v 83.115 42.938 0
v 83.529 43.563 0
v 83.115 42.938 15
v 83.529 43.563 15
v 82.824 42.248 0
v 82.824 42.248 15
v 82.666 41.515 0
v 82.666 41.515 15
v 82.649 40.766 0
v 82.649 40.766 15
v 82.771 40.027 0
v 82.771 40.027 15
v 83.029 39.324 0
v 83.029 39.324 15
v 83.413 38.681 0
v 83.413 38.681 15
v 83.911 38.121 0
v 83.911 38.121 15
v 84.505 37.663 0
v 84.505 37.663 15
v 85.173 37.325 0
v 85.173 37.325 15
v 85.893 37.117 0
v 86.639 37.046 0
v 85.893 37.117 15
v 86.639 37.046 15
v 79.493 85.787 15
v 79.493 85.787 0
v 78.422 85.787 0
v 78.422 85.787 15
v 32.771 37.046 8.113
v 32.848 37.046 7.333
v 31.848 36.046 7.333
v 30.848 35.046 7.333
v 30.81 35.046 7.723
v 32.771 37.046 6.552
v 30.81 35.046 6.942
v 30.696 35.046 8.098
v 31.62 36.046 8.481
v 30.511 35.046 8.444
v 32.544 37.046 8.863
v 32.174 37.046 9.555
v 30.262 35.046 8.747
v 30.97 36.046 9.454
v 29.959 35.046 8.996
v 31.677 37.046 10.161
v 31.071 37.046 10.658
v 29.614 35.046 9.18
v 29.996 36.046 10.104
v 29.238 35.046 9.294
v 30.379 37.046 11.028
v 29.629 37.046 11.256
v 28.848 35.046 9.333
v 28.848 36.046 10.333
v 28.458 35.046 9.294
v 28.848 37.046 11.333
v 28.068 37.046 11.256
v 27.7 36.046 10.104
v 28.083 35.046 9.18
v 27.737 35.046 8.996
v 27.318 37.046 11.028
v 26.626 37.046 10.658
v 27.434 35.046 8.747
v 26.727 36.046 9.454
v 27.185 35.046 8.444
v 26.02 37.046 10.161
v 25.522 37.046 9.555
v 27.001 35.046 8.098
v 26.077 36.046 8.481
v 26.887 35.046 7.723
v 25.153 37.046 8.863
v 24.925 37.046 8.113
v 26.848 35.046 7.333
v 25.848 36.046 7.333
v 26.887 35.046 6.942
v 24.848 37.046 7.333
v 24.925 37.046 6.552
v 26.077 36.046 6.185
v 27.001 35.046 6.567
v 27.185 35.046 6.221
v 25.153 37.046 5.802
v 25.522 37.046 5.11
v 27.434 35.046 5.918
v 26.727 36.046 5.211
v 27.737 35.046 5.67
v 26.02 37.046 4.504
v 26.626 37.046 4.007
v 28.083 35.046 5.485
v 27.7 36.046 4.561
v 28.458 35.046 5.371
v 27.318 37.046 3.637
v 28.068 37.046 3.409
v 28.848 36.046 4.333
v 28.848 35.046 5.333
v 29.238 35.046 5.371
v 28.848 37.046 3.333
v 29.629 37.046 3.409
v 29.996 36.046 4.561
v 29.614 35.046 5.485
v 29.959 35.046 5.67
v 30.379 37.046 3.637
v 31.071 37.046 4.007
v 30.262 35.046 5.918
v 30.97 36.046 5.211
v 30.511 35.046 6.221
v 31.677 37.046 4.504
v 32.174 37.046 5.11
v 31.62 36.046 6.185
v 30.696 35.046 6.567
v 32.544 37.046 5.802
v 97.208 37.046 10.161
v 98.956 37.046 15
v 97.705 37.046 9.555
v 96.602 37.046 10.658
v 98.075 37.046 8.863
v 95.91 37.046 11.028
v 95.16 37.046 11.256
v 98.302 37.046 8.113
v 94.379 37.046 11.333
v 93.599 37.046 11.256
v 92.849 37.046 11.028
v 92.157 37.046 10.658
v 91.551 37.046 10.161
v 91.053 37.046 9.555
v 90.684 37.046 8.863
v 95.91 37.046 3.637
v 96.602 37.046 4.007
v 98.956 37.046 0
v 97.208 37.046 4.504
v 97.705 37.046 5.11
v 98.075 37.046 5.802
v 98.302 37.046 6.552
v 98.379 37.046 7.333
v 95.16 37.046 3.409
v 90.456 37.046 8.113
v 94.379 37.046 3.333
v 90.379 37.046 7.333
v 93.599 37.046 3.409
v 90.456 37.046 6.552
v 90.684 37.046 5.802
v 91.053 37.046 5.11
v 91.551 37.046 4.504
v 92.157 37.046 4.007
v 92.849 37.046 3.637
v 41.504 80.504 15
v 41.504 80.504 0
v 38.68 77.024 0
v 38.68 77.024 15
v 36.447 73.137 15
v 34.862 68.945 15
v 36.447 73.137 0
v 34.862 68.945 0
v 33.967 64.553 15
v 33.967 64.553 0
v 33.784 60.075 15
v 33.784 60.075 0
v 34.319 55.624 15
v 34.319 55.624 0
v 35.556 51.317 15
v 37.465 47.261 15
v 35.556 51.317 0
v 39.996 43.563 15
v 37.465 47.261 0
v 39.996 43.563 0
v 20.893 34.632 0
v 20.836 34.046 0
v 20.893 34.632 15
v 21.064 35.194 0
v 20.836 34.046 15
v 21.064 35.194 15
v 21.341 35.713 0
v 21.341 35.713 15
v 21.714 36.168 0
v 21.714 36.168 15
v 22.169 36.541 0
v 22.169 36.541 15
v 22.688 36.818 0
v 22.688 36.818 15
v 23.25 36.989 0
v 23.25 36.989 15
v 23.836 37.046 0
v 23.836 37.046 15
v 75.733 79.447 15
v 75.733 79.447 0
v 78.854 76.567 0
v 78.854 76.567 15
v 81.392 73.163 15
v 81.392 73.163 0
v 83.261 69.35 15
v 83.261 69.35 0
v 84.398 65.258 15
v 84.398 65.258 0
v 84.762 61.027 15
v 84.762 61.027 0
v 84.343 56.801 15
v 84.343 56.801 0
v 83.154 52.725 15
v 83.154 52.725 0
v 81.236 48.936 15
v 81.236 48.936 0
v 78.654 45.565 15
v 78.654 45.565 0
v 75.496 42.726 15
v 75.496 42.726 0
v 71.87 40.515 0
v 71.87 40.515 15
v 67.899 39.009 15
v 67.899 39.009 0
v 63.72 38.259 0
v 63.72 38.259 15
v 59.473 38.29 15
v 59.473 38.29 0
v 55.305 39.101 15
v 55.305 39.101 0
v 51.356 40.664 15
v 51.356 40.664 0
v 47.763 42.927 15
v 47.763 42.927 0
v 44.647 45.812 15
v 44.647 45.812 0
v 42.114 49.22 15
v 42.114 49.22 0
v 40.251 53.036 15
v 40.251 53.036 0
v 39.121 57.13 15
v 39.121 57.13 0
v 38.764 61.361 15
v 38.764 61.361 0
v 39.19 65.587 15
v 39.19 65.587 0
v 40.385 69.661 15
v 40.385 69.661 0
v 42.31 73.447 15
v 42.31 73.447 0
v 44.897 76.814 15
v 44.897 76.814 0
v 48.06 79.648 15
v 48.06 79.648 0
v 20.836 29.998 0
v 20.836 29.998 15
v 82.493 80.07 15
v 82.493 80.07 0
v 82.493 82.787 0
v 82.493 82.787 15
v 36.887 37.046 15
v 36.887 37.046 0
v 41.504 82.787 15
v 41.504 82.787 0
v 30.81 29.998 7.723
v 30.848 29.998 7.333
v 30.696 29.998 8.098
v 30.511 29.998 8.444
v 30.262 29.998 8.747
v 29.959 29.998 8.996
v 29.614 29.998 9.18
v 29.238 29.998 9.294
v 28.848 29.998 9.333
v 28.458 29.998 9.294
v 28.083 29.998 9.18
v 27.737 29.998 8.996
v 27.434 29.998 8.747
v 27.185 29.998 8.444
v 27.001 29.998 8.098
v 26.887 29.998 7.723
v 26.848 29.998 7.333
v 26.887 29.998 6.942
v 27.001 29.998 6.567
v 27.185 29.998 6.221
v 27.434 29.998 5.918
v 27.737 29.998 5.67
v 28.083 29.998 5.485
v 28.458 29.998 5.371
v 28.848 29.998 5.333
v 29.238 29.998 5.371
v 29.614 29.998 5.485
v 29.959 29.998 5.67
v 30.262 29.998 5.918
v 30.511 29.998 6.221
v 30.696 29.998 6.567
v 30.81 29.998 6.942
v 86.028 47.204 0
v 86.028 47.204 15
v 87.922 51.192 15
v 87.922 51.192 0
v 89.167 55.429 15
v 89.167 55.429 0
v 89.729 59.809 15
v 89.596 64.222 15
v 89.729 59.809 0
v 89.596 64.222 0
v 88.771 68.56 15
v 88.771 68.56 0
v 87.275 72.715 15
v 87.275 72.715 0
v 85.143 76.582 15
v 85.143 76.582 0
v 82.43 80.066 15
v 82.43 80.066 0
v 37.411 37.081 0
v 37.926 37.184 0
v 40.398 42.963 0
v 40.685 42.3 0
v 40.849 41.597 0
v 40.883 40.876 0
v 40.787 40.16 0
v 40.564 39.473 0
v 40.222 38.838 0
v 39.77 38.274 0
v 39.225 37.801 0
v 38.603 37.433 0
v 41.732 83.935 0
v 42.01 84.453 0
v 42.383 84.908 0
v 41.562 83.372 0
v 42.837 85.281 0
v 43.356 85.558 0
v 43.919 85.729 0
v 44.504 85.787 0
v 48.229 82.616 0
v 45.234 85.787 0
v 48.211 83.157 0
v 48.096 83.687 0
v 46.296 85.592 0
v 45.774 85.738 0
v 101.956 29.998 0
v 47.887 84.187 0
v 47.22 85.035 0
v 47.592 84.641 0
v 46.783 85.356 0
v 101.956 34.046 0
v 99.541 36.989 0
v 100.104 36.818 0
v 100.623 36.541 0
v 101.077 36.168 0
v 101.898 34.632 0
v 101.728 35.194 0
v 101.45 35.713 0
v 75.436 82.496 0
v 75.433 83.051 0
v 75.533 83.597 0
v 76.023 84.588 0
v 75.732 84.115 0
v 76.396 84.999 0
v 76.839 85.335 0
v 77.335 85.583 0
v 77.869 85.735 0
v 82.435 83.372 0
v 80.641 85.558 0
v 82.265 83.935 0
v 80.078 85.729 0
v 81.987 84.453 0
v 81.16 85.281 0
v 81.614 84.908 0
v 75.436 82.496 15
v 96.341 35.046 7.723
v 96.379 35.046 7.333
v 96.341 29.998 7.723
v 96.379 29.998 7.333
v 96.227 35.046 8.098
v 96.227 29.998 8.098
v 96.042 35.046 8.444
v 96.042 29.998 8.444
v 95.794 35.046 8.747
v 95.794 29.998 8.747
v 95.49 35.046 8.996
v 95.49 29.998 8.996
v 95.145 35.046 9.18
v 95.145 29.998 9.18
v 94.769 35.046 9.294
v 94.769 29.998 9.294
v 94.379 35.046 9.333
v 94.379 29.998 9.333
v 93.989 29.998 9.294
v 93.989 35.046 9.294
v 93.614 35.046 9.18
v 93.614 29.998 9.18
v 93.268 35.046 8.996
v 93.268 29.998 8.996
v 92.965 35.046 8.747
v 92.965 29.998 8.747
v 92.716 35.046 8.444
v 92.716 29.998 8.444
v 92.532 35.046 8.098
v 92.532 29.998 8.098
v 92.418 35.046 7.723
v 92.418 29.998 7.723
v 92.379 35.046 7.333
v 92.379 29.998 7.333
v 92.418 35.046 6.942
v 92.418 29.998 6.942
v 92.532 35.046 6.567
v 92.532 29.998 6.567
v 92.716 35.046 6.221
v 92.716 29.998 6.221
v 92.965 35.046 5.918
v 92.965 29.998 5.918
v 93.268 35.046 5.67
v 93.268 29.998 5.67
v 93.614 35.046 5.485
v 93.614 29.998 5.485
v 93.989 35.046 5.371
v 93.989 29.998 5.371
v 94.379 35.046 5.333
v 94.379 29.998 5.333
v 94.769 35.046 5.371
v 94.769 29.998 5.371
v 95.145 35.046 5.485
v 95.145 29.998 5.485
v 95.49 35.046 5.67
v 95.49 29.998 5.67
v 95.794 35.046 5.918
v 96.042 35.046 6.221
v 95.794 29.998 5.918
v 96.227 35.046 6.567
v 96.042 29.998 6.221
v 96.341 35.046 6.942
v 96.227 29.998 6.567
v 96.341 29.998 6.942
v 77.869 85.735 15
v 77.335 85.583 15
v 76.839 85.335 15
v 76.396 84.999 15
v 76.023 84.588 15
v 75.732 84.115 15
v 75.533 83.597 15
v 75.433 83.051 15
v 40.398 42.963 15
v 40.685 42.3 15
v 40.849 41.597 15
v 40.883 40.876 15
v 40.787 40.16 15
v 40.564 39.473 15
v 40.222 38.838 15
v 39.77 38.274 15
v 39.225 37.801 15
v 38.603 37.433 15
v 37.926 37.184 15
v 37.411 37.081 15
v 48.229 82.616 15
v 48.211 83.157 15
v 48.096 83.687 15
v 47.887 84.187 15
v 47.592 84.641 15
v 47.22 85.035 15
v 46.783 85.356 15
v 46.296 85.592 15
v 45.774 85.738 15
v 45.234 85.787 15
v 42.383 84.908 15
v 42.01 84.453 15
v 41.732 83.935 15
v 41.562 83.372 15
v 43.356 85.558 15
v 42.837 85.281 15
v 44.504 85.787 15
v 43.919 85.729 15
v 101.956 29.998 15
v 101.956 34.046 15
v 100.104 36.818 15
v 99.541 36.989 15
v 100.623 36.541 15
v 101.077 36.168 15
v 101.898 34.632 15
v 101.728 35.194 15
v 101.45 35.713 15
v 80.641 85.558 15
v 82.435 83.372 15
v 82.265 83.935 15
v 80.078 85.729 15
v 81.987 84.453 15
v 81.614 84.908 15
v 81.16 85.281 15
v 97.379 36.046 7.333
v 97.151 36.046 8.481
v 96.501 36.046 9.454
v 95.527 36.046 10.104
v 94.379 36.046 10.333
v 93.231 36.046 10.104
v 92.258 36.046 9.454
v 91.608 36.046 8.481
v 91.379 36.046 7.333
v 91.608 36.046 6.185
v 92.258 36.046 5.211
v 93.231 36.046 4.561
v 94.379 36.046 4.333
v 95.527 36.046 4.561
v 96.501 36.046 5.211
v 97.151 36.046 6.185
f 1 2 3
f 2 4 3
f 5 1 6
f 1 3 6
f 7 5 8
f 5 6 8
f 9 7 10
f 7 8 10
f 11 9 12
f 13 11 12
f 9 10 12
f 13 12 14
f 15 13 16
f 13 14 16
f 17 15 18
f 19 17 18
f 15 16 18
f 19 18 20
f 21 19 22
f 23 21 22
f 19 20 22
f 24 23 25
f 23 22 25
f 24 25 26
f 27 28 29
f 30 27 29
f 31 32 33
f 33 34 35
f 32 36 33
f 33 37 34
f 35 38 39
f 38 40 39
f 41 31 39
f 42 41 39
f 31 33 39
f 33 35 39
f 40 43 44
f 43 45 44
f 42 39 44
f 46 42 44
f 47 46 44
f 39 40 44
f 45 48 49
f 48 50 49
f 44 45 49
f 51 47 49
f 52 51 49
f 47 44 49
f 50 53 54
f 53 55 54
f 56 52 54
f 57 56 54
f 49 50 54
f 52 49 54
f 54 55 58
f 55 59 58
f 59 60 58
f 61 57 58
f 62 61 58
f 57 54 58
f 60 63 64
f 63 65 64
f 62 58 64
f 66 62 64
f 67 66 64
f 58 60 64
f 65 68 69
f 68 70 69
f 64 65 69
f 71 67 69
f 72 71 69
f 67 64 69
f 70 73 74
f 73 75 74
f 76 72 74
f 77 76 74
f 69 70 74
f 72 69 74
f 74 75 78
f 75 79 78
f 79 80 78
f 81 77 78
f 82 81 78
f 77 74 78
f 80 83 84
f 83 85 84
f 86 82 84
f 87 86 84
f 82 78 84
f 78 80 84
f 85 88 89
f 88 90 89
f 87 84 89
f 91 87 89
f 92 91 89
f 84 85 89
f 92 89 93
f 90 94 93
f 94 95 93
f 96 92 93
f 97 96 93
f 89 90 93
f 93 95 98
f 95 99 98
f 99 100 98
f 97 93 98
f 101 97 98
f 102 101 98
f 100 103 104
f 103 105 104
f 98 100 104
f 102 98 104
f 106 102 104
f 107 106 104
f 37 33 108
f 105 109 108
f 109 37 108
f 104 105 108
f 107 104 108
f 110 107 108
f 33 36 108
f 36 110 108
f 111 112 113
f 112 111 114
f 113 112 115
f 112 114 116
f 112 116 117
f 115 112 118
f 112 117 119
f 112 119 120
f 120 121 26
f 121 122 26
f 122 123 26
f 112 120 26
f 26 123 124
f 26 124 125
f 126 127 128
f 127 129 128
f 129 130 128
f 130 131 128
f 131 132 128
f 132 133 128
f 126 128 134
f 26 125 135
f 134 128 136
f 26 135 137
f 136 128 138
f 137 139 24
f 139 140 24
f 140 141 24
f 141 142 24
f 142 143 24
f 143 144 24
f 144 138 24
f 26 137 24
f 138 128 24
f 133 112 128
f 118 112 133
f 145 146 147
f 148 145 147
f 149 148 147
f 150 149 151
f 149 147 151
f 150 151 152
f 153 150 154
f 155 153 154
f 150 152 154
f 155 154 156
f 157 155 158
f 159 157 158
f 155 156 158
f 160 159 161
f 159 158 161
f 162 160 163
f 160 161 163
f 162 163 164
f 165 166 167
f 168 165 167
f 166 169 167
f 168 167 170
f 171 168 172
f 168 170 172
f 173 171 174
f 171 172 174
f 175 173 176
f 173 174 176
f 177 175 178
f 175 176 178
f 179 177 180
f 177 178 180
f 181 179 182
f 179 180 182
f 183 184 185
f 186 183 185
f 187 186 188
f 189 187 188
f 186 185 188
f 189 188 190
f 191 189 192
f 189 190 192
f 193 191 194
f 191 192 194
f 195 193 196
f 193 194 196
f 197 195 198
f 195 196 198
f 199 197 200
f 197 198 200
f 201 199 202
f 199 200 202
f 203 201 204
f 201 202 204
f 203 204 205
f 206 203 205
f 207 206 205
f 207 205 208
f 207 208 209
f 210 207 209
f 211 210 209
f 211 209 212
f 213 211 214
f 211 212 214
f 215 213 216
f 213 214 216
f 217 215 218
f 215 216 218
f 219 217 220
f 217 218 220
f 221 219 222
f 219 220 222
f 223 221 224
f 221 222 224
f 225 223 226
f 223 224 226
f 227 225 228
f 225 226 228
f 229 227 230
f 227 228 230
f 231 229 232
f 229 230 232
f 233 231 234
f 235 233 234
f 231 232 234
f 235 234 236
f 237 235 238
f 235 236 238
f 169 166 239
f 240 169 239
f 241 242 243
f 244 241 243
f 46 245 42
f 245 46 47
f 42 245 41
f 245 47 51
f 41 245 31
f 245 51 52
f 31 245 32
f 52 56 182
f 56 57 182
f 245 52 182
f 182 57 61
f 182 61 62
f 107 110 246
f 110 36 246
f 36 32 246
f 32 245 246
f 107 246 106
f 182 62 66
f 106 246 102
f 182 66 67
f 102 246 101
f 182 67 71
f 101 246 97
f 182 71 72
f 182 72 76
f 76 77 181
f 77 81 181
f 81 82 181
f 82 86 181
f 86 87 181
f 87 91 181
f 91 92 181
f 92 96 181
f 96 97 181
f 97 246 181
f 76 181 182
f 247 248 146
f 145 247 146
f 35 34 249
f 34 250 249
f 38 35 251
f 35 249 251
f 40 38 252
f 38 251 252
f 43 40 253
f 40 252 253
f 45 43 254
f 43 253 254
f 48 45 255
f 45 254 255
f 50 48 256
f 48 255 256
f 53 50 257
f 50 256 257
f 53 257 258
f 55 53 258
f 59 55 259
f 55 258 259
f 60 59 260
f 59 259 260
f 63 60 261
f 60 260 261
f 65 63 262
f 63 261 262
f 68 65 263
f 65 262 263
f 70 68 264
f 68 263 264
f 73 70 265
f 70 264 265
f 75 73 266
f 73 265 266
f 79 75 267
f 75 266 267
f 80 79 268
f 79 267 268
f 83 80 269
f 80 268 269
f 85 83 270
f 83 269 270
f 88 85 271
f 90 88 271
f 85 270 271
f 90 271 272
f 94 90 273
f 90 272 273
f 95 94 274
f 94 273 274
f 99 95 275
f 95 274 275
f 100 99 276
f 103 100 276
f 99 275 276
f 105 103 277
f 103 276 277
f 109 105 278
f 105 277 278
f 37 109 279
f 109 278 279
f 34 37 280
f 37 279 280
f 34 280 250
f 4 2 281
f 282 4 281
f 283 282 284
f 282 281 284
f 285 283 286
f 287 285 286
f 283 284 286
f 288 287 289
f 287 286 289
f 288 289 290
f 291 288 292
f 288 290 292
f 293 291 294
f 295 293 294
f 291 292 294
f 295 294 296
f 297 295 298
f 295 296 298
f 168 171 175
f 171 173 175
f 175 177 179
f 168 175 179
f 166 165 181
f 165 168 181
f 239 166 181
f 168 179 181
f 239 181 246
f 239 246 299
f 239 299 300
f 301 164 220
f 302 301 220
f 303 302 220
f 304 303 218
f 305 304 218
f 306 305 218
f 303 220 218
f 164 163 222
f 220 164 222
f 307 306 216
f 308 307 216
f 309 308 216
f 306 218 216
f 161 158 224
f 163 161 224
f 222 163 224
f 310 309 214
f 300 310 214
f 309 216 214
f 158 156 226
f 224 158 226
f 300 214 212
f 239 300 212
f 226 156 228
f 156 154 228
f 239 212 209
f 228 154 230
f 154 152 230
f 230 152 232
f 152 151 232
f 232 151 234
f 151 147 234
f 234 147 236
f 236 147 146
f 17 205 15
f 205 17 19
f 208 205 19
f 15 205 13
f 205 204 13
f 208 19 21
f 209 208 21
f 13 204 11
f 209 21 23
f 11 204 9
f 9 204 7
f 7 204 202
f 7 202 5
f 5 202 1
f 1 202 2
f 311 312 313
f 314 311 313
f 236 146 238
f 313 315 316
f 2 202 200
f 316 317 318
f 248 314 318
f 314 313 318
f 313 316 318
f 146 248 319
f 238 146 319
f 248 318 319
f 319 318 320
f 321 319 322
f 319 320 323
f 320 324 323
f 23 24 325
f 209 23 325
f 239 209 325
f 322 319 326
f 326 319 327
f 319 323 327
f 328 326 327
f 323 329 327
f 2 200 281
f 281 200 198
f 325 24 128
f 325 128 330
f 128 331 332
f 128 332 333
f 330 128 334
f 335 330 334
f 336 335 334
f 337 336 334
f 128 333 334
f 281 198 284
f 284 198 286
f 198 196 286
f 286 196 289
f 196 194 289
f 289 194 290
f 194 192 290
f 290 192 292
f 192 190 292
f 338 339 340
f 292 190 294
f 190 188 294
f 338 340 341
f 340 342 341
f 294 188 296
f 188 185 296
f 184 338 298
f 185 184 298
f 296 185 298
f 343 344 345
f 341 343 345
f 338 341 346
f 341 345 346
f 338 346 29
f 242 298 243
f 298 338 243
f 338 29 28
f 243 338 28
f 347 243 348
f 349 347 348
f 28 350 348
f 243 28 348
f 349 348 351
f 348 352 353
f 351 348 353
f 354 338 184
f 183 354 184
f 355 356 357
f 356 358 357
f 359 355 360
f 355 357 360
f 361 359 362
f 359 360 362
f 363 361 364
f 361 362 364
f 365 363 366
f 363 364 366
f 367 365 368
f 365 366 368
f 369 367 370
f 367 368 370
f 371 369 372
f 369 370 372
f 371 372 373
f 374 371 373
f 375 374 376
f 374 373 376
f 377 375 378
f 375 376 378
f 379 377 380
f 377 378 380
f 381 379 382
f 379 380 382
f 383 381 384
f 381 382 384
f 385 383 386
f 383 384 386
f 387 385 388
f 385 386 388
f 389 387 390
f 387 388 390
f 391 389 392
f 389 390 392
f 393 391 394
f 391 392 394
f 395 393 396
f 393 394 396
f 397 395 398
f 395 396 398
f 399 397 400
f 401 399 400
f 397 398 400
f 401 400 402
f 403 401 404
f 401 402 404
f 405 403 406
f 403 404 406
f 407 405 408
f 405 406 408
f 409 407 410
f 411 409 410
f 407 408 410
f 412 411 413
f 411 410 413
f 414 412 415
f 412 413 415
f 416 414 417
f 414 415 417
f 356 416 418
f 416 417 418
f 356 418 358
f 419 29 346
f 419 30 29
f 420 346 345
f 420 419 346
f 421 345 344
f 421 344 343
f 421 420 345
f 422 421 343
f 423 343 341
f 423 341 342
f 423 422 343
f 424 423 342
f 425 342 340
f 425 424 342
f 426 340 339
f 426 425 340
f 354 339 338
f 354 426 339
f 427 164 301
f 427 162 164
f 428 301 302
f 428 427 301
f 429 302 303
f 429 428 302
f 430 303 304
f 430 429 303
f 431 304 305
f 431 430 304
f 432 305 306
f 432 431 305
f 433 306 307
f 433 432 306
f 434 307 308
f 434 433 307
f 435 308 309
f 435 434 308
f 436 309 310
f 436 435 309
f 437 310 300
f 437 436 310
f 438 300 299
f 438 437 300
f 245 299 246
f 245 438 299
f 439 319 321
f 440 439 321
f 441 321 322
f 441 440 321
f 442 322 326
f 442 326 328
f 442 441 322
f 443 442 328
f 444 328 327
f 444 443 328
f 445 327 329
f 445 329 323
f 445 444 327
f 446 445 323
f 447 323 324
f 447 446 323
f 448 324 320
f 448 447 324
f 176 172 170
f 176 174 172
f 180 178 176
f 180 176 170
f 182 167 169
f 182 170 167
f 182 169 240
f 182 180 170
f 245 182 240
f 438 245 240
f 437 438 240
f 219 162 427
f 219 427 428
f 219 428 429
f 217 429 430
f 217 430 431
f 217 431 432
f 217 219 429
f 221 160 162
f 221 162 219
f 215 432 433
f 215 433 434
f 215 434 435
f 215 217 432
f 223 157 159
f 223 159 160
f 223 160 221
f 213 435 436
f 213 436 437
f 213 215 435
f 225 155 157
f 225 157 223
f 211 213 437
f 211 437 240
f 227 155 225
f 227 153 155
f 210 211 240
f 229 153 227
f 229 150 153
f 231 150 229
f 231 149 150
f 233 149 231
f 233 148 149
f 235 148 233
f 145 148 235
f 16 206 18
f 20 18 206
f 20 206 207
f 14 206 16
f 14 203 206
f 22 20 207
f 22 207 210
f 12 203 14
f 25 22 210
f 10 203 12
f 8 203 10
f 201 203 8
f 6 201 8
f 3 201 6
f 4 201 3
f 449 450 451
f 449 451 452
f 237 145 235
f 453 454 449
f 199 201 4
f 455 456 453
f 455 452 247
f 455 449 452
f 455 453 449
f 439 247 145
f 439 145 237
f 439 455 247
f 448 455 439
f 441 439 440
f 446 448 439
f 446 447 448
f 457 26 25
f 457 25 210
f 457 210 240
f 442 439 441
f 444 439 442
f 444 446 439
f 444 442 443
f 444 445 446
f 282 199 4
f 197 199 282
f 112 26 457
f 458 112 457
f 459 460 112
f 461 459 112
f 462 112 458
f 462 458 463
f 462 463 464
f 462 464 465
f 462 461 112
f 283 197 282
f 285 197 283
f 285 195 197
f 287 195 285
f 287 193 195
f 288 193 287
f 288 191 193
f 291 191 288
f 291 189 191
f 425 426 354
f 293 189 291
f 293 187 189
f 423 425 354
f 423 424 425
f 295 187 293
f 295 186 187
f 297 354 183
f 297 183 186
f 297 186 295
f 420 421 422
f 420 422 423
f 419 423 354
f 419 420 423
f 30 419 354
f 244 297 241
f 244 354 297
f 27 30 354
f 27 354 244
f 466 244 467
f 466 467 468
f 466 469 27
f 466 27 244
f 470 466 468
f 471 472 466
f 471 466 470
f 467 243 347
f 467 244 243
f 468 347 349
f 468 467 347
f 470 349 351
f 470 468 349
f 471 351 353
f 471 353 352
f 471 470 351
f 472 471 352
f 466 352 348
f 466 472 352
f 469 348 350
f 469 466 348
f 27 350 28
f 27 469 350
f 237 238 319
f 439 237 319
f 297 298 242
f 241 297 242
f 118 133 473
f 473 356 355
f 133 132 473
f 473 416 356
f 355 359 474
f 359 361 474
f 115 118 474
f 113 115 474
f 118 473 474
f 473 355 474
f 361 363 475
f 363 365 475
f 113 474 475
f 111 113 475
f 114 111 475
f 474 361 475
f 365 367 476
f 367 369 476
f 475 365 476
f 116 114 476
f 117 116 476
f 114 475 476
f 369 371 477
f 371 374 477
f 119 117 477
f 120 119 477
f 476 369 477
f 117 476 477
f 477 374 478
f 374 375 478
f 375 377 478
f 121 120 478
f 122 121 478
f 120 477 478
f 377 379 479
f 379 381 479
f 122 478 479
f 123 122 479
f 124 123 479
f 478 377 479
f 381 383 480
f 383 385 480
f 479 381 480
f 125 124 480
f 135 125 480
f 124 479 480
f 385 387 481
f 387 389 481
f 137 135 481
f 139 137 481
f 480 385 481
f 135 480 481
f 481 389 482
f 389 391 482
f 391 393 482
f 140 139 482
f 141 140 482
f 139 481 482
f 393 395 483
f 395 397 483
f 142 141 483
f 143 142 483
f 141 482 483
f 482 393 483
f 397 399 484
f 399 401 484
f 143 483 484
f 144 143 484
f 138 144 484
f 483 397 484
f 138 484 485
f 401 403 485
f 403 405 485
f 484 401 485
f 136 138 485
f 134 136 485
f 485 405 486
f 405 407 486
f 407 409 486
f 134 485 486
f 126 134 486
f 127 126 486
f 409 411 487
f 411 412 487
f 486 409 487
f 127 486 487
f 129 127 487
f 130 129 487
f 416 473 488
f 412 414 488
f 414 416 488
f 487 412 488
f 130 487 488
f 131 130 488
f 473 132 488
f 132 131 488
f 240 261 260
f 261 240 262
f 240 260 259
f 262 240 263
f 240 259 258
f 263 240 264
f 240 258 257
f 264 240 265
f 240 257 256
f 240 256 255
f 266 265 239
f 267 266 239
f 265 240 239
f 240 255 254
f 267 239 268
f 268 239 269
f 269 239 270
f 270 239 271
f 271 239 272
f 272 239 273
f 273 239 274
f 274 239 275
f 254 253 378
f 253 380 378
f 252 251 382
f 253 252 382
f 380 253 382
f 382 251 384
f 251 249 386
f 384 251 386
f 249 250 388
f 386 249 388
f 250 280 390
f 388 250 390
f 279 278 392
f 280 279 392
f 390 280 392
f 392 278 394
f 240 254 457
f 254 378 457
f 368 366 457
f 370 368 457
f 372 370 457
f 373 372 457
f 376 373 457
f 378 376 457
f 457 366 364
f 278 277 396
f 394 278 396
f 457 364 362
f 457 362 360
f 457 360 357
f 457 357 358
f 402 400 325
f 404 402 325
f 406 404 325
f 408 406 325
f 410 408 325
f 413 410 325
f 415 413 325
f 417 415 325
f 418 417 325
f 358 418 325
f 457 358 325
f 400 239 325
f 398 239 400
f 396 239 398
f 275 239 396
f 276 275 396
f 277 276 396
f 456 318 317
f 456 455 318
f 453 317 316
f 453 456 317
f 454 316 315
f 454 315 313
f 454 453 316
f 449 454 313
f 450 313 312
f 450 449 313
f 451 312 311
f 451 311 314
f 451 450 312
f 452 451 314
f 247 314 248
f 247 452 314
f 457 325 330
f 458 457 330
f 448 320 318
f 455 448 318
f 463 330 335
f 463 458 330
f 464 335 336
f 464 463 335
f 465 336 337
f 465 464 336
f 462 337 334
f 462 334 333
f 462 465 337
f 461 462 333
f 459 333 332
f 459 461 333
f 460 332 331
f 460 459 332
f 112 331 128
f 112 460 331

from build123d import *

# Parameters (mm, degrees)
F1_DEPTH       = 15
F2_R           = 3
F4_D           = 4
F4_CSINK_D     = 8
F4_CSINK_ANGLE = 90
F5_R           = 4


with BuildPart() as f1:
    # F0 (on Top) → F1 (new body)
    with BuildSketch(Plane.XY):
        with BuildLine():
            Line((20.835556, 37.046353), (20.835556, 29.997582))
            Line((20.835556, 29.997582), (101.955885, 29.997582))
            Line((101.955885, 29.997582), (101.955885, 37.046353))
            Line((101.955885, 37.046353), (75.967759, 37.046353))
            ThreePointArc((75.967759, 37.046353), (89.452061, 57.015966), (82.430315, 80.066062))
            Line((82.430315, 80.066062), (82.492916, 80.06982))
            Line((82.492916, 80.06982), (82.492916, 85.78659))
            Line((82.492916, 85.78659), (75.115513, 85.78659))
            Line((75.115513, 85.78659), (75.732713, 79.446834))
            ThreePointArc((75.732713, 79.446834), (61.595594, 38.176149), (48.059836, 79.647957))
            Line((48.059836, 79.647957), (48.409987, 85.78659))
            Line((48.409987, 85.78659), (41.504001, 85.78659))
            Line((41.504001, 85.78659), (41.504001, 80.503838))
            ThreePointArc((41.504001, 80.503838), (33.996464, 57.565367), (47.120148, 37.309369))
            ThreePointArc((47.120148, 37.309369), (47.338346, 37.176863), (47.557742, 37.046353))
            Line((47.557742, 37.046353), (20.835556, 37.046353))
        make_face()
    extrude(amount=F1_DEPTH)

    # F2
    f2_edges = [f1.edges().sort_by_distance(p)[0] for p in [
        (75.115513, 85.78659, 7.5),
        (82.492916, 85.78659, 7.5),
        (48.409987, 85.78659, 7.5),
        (41.504001, 85.78659, 7.5),
        (20.835556, 37.046353, 7.5),
        (101.955885, 37.046353, 7.5),
    ]]
    fillet(f2_edges, radius=F2_R)

    # F4 (through all)
    with Locations(Plane(origin=(0, 37.046353, 0), x_dir=(-1, 0, 0), z_dir=(0, 1, 0))):
        with Locations((-94.379296, 7.332574), (-28.848284, 7.332574)):
            CounterSinkHole(F4_D / 2, F4_CSINK_D / 2, counter_sink_angle=F4_CSINK_ANGLE)

    # F5
    f5_edges = [f1.edges().sort_by_distance(p)[0] for p in [
        (75.967759, 37.046353, 7.5),
        (47.557742, 37.046353, 7.5),
    ]]
    fillet(f5_edges, radius=F5_R)


solid = f1.part
